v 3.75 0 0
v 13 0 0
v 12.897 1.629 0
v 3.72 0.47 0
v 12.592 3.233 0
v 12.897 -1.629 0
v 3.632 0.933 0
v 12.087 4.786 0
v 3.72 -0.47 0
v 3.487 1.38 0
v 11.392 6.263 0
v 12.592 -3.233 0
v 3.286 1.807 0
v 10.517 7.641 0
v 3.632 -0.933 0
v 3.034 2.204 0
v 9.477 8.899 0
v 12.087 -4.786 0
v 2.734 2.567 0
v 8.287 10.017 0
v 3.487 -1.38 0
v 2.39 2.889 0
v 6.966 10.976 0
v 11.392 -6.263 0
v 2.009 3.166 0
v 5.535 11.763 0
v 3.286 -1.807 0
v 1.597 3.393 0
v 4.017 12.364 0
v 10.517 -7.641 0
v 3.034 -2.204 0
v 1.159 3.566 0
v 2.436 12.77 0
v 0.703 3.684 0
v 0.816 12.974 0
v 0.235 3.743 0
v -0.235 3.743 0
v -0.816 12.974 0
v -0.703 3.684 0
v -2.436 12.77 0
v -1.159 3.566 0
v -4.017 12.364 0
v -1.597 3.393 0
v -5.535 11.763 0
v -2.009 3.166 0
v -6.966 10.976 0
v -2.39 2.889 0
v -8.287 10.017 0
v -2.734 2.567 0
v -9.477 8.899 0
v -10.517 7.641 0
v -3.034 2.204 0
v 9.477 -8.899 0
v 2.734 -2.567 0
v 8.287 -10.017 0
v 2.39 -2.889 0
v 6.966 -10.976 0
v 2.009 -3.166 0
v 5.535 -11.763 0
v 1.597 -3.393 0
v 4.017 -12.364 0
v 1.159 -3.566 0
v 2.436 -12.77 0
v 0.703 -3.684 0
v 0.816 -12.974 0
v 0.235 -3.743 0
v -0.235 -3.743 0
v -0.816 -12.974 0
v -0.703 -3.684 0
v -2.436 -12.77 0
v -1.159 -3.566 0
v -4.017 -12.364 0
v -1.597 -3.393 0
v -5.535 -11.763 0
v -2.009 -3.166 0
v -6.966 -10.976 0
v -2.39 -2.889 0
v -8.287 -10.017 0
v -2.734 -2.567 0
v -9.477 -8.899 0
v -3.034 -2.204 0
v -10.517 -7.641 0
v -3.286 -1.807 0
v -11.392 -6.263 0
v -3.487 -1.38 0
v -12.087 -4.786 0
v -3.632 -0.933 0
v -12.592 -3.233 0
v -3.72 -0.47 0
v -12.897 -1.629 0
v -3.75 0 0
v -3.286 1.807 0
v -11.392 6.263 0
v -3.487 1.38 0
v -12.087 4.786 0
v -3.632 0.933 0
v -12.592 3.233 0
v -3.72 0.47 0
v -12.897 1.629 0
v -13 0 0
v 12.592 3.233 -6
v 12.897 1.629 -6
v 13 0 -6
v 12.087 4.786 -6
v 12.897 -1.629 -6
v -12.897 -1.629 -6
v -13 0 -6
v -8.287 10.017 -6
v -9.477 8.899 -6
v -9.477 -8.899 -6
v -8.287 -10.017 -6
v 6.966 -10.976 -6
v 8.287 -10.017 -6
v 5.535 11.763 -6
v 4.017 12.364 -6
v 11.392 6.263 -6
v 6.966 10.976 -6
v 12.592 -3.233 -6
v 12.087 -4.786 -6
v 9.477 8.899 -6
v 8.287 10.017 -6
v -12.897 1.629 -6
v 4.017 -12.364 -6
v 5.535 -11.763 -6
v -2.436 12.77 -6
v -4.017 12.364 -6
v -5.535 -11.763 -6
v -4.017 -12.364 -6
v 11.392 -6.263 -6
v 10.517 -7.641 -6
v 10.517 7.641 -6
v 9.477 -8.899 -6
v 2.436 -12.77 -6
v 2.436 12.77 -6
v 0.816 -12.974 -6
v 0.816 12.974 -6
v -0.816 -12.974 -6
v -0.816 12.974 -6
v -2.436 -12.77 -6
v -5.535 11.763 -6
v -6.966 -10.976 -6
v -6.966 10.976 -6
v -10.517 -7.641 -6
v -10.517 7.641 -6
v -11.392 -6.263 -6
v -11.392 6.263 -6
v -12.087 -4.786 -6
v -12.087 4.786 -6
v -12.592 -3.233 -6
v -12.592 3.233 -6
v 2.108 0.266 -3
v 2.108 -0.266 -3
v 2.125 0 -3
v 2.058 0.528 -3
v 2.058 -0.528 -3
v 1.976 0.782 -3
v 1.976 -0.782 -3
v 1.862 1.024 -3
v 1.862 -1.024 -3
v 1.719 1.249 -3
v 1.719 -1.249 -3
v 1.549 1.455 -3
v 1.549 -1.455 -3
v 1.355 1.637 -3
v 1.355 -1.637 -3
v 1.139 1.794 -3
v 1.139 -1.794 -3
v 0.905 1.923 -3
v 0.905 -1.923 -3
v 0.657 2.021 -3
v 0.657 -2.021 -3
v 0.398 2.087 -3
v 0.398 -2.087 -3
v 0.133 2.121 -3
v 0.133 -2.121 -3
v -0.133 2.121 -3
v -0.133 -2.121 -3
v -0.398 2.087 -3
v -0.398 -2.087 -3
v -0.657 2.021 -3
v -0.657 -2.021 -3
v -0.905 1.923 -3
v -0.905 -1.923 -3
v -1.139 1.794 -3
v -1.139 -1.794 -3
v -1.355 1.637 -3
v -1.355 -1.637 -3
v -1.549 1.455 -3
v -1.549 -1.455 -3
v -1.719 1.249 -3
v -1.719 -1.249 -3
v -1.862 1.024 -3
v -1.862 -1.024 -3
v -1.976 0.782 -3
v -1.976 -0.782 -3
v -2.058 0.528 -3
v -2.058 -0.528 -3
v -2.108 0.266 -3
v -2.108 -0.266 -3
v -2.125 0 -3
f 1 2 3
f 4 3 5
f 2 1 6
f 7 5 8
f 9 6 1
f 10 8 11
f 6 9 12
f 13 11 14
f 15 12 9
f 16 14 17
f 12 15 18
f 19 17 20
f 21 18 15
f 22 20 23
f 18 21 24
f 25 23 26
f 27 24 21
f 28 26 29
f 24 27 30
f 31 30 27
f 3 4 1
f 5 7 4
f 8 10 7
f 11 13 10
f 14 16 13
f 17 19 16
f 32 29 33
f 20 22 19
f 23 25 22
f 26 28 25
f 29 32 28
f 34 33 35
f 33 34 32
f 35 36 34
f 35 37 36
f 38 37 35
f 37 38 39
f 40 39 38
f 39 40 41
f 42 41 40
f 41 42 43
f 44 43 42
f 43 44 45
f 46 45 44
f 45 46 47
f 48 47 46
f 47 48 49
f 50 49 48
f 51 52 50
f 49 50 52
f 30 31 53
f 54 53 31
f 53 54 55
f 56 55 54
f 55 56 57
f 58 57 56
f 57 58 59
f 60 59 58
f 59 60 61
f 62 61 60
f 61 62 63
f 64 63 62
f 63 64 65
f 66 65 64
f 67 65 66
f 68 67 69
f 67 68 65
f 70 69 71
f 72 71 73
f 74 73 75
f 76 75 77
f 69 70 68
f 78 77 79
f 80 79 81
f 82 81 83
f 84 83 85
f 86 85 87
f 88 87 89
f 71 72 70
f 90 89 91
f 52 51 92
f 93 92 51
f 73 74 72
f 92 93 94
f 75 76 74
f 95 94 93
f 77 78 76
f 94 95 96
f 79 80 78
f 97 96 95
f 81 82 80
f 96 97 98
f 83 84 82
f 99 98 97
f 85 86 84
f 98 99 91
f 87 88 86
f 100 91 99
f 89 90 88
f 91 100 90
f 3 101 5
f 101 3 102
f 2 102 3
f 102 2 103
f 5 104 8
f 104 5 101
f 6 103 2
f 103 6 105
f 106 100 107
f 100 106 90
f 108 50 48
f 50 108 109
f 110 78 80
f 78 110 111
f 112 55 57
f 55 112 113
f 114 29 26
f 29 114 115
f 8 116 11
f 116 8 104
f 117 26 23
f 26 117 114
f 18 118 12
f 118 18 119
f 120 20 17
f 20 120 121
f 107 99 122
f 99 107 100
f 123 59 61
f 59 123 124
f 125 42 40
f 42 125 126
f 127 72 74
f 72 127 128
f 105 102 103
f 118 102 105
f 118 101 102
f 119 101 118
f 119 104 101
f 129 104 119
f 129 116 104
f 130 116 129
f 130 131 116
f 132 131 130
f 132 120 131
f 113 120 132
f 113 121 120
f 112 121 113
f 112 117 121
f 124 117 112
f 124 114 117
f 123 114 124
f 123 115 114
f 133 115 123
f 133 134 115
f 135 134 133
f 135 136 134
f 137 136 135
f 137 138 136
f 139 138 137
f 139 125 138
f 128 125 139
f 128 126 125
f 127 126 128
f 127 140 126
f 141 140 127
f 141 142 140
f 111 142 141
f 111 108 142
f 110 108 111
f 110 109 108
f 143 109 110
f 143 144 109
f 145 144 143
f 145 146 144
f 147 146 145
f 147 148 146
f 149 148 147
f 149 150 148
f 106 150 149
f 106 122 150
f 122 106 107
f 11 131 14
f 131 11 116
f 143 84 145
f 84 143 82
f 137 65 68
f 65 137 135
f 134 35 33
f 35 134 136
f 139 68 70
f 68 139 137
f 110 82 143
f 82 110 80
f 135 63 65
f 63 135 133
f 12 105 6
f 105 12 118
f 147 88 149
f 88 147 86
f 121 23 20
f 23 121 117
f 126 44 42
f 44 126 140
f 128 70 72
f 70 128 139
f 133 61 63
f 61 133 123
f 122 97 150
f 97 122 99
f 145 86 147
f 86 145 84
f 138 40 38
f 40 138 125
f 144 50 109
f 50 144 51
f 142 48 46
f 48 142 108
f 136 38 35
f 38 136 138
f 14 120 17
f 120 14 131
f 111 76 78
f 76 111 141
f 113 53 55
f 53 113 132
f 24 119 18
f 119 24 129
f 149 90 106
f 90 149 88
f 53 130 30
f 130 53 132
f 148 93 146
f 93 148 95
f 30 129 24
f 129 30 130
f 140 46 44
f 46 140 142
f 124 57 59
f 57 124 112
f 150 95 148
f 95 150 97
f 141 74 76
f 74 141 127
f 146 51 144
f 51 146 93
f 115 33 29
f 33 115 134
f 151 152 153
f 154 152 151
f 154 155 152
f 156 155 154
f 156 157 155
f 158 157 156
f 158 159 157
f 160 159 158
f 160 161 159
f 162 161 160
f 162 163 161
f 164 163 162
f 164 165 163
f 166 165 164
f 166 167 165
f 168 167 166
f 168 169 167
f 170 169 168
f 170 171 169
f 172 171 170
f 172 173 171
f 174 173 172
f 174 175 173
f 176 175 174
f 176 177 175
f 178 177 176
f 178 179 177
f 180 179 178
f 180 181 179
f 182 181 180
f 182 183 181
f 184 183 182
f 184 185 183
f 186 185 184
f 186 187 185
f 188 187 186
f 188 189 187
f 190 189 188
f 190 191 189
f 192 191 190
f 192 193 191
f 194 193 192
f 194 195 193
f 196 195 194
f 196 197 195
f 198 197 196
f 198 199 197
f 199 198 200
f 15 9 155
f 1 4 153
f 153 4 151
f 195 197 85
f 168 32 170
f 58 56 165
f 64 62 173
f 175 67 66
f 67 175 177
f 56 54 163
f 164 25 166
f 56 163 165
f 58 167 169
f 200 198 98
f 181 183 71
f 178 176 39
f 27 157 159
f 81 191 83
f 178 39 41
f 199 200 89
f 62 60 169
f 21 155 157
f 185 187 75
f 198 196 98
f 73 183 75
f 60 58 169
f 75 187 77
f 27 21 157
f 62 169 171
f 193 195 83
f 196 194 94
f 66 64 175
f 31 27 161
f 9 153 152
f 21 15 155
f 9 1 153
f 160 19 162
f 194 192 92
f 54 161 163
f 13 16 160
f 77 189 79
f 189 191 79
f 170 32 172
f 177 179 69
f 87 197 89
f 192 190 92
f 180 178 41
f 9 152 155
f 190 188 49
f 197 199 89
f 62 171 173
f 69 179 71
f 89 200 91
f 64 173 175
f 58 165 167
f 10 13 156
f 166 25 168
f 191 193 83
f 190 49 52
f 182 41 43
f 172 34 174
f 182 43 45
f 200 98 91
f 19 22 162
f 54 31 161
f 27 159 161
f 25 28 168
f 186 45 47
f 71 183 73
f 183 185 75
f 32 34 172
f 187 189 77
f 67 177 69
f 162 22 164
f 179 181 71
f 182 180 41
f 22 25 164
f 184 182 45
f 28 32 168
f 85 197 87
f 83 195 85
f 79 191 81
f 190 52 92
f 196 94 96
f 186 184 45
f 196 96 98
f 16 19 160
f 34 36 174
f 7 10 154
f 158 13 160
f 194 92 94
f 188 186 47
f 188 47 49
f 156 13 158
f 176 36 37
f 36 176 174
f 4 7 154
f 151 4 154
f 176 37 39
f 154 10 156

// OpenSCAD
$fn = 50;


difference() {
	union() {
		translate(v = [0, 0, -3.0000000000]) {
			cylinder(h = 3, r = 10.0000000000);
		}
		translate(v = [0, 0, -6.0000000000]) {
			cylinder(h = 6, r = 13.0000000000);
		}
	}
	union() {
		translate(v = [0, 0, 0]) {
			rotate(a = [0, 0, 0]) {
				difference() {
					union() {
						#translate(v = [0, 0, -3.0000000000]) {
							cylinder(h = 3, r = 2.0000000000);
						}
						#translate(v = [0, 0, -3]) {
							cylinder(h = 3, r1 = 2.1250000000, r2 = 3.7500000000);
						}
						#translate(v = [0, 0, -3.0000000000]) {
							cylinder(h = 3, r = 2.1250000000);
						}
						#translate(v = [0, 0, -3.0000000000]) {
							cylinder(h = 3, r = 2.0000000000);
						}
					}
					union();
				}
			}
		}
	}
}
